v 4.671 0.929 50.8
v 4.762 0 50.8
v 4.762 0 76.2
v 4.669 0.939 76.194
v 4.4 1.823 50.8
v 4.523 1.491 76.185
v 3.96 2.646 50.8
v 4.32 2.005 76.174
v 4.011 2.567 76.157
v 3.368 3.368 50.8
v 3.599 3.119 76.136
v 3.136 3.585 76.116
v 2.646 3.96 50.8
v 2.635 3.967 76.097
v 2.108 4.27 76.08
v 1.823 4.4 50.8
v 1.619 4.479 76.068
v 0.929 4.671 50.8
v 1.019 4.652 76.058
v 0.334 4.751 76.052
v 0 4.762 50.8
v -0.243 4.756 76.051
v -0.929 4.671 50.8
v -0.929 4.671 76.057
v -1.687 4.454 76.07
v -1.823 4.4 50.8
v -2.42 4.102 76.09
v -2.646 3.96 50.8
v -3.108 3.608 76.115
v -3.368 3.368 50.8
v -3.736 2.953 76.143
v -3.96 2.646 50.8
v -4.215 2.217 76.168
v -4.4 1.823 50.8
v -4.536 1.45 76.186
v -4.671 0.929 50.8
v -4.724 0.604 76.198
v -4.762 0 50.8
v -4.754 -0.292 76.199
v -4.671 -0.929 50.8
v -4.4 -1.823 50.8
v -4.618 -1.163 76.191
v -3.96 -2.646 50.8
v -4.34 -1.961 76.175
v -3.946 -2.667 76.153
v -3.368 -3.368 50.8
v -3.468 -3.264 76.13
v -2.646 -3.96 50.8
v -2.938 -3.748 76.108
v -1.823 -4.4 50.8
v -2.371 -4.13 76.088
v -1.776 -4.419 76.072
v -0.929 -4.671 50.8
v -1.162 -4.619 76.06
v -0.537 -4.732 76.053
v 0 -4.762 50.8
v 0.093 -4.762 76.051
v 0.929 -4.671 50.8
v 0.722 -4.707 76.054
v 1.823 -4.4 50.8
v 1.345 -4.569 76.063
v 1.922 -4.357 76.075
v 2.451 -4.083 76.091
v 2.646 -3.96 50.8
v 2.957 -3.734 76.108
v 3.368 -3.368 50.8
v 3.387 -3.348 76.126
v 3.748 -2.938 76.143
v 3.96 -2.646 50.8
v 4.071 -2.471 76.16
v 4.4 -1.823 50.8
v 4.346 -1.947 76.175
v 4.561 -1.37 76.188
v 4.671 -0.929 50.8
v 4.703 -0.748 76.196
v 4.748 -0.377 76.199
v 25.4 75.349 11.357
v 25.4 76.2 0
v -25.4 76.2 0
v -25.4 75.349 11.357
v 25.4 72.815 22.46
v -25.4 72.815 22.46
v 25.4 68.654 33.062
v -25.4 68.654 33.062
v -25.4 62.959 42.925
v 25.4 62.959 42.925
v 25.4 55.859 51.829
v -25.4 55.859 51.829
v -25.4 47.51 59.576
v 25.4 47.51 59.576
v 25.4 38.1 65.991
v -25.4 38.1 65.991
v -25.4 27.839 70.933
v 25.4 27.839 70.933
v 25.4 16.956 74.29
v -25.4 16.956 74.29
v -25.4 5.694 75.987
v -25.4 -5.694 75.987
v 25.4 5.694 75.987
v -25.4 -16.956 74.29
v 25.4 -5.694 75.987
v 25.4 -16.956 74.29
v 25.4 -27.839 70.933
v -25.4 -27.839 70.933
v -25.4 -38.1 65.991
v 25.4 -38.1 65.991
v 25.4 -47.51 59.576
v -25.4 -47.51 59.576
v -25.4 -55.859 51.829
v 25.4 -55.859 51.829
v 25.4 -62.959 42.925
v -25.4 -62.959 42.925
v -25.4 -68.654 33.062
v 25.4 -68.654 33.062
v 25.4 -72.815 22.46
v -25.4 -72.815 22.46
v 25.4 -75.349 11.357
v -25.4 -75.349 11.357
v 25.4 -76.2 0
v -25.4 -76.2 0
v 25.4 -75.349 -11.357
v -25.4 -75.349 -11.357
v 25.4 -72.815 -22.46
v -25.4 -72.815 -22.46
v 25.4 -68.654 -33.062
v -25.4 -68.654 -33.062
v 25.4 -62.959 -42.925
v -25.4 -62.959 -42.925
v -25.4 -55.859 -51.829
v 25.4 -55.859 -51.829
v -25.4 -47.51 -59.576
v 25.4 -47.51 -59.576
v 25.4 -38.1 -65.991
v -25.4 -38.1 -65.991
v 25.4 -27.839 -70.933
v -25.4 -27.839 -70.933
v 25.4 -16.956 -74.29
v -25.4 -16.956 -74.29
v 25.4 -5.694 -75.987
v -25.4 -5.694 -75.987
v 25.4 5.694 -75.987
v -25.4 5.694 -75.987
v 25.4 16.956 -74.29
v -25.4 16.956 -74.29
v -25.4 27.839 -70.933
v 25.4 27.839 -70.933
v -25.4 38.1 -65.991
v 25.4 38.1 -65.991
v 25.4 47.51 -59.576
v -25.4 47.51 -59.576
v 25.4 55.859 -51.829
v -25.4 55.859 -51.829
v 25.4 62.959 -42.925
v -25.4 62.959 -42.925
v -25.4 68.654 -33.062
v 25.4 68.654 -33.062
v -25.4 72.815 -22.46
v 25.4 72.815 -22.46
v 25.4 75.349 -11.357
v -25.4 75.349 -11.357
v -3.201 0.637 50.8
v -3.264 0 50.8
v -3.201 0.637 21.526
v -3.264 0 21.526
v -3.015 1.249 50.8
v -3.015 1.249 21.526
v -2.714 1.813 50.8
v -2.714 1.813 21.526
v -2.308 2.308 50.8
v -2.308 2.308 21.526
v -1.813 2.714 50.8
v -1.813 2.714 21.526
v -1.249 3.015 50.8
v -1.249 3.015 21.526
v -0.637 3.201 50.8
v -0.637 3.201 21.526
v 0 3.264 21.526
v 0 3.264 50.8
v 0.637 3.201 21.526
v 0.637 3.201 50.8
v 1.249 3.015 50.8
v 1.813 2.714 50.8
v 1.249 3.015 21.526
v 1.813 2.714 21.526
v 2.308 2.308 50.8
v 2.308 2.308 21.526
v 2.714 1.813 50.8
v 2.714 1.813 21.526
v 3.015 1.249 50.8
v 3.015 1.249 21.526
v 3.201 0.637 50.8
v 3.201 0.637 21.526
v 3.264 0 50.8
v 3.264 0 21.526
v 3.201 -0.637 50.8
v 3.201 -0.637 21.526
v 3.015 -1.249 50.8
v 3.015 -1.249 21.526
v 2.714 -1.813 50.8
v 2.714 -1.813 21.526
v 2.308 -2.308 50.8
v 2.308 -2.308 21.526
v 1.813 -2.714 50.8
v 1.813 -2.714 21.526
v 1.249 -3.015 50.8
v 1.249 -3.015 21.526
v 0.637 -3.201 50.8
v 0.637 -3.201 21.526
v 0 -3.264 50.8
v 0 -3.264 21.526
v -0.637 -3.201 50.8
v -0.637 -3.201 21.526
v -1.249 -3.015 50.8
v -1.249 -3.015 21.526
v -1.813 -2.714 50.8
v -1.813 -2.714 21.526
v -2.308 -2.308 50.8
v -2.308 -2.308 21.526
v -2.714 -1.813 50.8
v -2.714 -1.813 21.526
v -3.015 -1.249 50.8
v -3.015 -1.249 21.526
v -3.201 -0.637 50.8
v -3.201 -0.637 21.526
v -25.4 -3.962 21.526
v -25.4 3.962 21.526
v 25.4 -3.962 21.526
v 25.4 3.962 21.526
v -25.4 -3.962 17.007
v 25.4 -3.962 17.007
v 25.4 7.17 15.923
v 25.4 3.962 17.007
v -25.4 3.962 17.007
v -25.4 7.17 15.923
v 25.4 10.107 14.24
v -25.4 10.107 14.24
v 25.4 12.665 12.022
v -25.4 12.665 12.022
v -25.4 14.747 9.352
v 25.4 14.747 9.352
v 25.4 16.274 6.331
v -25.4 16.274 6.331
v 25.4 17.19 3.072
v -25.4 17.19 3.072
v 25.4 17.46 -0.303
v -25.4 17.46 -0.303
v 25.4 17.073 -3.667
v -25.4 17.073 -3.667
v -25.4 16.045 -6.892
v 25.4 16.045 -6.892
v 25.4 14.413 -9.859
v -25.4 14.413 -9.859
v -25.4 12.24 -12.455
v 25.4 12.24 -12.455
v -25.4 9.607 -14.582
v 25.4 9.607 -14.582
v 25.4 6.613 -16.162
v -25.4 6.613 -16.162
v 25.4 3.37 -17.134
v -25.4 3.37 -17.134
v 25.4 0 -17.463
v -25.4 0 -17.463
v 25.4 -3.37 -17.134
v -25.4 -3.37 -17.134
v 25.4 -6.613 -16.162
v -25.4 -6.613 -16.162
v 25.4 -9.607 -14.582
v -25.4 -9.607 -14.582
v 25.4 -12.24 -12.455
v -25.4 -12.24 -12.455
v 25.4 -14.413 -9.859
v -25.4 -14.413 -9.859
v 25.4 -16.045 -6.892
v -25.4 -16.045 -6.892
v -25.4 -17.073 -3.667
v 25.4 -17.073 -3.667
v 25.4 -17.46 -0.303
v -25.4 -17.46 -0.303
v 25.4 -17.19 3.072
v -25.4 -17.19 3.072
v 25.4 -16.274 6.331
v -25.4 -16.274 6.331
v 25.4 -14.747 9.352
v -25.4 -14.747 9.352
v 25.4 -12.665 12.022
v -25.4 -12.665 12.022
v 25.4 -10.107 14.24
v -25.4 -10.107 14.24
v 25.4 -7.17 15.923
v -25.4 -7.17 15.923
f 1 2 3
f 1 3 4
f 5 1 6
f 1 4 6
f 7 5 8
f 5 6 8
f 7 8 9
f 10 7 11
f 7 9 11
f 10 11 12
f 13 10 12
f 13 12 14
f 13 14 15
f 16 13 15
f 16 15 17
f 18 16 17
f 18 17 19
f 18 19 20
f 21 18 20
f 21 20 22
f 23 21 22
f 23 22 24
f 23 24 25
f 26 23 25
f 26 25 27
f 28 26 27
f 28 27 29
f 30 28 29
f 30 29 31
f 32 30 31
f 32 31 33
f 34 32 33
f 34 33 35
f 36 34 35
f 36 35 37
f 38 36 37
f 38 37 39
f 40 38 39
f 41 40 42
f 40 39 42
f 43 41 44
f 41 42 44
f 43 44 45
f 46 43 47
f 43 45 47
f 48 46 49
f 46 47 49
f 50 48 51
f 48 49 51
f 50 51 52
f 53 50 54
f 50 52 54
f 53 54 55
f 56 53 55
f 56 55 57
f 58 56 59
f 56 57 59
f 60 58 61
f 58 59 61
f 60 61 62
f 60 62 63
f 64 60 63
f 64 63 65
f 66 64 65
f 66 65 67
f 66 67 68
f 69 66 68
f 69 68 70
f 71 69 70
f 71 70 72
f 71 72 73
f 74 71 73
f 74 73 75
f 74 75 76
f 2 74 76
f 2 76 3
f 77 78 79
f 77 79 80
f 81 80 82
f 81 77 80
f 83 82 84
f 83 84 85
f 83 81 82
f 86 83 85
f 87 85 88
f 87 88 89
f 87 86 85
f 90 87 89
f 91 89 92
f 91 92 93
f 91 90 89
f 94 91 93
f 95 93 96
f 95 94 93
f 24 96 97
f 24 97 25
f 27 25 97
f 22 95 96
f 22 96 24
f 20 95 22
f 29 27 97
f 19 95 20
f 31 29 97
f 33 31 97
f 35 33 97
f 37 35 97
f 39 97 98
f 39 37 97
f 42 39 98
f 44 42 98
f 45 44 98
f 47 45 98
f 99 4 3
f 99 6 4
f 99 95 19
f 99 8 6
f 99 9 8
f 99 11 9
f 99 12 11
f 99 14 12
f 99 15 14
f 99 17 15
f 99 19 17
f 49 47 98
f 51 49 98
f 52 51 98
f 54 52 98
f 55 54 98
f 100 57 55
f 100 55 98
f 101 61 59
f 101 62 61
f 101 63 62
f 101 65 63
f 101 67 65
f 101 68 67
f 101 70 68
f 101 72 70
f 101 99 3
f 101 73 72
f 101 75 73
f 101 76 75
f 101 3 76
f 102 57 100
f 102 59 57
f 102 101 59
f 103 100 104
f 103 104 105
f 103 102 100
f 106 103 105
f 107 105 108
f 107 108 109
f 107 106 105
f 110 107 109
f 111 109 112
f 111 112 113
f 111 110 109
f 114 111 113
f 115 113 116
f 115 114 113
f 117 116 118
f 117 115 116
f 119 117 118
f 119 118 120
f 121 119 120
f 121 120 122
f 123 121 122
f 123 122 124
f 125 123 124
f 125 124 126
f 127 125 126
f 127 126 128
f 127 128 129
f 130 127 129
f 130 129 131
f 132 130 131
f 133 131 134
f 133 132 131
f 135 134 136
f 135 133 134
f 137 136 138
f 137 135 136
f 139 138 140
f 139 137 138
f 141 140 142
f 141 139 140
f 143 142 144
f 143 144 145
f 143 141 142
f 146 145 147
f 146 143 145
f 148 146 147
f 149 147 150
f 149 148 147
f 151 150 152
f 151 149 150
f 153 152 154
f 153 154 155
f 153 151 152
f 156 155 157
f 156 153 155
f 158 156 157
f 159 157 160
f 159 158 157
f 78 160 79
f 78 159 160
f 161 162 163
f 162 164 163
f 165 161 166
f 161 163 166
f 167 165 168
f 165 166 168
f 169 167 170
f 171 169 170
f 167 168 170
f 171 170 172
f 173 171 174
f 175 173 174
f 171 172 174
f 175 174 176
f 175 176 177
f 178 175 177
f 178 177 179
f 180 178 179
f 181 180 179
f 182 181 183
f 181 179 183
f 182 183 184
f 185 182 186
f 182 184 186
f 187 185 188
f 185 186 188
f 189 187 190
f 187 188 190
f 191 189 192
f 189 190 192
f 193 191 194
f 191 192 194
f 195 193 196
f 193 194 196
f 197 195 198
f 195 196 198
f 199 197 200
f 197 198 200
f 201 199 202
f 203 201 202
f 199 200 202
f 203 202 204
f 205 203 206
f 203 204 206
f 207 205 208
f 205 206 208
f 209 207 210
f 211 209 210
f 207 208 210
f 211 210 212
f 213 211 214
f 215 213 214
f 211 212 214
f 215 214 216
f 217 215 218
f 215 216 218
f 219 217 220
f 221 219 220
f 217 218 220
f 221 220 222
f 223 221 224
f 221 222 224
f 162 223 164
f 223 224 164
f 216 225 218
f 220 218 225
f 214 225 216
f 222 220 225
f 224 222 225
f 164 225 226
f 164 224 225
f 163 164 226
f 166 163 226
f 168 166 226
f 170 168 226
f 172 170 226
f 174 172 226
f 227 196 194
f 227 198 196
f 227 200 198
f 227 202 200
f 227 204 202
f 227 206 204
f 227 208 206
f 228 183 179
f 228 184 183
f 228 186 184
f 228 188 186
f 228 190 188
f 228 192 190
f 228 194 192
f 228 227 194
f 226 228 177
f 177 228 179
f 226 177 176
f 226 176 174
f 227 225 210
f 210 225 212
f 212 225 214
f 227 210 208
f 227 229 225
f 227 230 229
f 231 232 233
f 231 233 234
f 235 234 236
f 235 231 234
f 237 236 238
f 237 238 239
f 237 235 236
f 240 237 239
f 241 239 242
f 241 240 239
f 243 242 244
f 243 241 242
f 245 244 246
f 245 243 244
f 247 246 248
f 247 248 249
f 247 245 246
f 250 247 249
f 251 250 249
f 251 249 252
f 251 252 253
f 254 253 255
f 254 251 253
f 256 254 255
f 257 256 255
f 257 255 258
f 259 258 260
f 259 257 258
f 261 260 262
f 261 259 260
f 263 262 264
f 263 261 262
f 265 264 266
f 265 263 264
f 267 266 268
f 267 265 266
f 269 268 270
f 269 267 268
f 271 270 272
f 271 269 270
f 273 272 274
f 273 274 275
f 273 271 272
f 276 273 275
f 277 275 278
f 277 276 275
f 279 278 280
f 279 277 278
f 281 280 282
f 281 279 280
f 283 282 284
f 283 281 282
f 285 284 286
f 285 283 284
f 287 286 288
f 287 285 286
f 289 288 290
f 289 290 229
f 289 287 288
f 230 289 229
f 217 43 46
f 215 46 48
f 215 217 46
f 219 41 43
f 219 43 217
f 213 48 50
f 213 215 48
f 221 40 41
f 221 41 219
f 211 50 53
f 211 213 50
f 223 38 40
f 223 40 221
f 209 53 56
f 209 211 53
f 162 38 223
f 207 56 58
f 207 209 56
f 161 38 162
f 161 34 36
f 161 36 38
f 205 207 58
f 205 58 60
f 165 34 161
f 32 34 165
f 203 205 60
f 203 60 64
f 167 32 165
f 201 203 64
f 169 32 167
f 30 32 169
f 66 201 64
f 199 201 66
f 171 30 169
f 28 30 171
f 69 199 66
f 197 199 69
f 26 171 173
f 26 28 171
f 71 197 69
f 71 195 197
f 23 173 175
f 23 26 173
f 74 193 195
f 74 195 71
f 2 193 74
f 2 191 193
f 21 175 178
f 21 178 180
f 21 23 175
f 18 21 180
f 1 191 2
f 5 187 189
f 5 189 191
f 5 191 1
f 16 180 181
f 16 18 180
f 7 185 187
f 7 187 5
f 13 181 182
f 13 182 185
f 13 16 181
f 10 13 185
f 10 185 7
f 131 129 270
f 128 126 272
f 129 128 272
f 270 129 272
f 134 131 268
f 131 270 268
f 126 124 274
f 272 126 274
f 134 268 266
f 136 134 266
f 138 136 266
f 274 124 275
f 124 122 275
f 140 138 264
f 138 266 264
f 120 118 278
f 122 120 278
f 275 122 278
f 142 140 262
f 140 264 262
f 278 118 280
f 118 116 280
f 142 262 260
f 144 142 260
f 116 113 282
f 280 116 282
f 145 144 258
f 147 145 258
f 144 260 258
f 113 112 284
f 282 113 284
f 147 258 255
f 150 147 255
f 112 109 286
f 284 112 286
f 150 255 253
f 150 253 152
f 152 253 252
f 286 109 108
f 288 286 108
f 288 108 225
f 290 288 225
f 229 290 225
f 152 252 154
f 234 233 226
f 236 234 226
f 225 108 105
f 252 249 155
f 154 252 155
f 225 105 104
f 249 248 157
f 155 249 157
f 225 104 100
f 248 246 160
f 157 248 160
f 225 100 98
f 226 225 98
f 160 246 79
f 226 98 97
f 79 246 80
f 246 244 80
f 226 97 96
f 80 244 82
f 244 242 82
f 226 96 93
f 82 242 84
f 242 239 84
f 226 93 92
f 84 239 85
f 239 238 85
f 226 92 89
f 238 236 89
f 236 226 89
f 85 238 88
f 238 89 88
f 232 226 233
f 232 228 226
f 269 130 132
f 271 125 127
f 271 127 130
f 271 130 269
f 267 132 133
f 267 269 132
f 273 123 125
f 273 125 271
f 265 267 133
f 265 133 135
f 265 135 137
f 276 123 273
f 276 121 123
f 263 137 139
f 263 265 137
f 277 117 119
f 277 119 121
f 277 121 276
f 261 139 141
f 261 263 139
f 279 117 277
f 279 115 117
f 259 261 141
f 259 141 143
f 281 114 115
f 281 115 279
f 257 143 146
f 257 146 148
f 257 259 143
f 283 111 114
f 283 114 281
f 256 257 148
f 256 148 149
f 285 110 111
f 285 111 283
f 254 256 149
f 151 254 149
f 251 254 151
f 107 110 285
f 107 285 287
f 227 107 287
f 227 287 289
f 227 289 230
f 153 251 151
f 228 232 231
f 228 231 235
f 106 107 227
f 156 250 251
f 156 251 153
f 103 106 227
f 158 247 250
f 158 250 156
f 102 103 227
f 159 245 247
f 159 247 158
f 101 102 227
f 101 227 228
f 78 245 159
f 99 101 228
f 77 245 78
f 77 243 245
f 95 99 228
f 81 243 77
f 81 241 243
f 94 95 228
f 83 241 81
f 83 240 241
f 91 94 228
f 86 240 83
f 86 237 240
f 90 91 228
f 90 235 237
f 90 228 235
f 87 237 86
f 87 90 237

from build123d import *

# Parameters (mm, degrees)
F0_R           = 76.2
F1_DEPTH       = 25.4
F4_D           = 6.5278
F4_DEPTH       = 76.2
F4_CBORE_D     = 9.525
F4_CBORE_DEPTH = 25.4


with BuildPart() as f1:
    # F0 (on Right) → F1 (new body, symmetric)
    with BuildSketch(Plane.YZ):
        Circle(F0_R)
        with BuildLine():
            ThreePointArc((3.9624, 17.007007), (0, -17.4625), (-3.9624, 17.007007))
            Line((-3.9624, 17.007007), (-3.9624, 21.5265))
            Line((-3.9624, 21.5265), (3.9624, 21.5265))
            Line((3.9624, 21.5265), (3.9624, 17.007007))
        make_face(mode=Mode.SUBTRACT)
    extrude(amount=F1_DEPTH, both=True)

    # F4
    with Locations(Plane.XY.offset(76.2)):
        with Locations((0, 0)):
            CounterBoreHole(F4_D / 2, F4_CBORE_D / 2, F4_CBORE_DEPTH, depth=F4_DEPTH)


solid = f1.part
